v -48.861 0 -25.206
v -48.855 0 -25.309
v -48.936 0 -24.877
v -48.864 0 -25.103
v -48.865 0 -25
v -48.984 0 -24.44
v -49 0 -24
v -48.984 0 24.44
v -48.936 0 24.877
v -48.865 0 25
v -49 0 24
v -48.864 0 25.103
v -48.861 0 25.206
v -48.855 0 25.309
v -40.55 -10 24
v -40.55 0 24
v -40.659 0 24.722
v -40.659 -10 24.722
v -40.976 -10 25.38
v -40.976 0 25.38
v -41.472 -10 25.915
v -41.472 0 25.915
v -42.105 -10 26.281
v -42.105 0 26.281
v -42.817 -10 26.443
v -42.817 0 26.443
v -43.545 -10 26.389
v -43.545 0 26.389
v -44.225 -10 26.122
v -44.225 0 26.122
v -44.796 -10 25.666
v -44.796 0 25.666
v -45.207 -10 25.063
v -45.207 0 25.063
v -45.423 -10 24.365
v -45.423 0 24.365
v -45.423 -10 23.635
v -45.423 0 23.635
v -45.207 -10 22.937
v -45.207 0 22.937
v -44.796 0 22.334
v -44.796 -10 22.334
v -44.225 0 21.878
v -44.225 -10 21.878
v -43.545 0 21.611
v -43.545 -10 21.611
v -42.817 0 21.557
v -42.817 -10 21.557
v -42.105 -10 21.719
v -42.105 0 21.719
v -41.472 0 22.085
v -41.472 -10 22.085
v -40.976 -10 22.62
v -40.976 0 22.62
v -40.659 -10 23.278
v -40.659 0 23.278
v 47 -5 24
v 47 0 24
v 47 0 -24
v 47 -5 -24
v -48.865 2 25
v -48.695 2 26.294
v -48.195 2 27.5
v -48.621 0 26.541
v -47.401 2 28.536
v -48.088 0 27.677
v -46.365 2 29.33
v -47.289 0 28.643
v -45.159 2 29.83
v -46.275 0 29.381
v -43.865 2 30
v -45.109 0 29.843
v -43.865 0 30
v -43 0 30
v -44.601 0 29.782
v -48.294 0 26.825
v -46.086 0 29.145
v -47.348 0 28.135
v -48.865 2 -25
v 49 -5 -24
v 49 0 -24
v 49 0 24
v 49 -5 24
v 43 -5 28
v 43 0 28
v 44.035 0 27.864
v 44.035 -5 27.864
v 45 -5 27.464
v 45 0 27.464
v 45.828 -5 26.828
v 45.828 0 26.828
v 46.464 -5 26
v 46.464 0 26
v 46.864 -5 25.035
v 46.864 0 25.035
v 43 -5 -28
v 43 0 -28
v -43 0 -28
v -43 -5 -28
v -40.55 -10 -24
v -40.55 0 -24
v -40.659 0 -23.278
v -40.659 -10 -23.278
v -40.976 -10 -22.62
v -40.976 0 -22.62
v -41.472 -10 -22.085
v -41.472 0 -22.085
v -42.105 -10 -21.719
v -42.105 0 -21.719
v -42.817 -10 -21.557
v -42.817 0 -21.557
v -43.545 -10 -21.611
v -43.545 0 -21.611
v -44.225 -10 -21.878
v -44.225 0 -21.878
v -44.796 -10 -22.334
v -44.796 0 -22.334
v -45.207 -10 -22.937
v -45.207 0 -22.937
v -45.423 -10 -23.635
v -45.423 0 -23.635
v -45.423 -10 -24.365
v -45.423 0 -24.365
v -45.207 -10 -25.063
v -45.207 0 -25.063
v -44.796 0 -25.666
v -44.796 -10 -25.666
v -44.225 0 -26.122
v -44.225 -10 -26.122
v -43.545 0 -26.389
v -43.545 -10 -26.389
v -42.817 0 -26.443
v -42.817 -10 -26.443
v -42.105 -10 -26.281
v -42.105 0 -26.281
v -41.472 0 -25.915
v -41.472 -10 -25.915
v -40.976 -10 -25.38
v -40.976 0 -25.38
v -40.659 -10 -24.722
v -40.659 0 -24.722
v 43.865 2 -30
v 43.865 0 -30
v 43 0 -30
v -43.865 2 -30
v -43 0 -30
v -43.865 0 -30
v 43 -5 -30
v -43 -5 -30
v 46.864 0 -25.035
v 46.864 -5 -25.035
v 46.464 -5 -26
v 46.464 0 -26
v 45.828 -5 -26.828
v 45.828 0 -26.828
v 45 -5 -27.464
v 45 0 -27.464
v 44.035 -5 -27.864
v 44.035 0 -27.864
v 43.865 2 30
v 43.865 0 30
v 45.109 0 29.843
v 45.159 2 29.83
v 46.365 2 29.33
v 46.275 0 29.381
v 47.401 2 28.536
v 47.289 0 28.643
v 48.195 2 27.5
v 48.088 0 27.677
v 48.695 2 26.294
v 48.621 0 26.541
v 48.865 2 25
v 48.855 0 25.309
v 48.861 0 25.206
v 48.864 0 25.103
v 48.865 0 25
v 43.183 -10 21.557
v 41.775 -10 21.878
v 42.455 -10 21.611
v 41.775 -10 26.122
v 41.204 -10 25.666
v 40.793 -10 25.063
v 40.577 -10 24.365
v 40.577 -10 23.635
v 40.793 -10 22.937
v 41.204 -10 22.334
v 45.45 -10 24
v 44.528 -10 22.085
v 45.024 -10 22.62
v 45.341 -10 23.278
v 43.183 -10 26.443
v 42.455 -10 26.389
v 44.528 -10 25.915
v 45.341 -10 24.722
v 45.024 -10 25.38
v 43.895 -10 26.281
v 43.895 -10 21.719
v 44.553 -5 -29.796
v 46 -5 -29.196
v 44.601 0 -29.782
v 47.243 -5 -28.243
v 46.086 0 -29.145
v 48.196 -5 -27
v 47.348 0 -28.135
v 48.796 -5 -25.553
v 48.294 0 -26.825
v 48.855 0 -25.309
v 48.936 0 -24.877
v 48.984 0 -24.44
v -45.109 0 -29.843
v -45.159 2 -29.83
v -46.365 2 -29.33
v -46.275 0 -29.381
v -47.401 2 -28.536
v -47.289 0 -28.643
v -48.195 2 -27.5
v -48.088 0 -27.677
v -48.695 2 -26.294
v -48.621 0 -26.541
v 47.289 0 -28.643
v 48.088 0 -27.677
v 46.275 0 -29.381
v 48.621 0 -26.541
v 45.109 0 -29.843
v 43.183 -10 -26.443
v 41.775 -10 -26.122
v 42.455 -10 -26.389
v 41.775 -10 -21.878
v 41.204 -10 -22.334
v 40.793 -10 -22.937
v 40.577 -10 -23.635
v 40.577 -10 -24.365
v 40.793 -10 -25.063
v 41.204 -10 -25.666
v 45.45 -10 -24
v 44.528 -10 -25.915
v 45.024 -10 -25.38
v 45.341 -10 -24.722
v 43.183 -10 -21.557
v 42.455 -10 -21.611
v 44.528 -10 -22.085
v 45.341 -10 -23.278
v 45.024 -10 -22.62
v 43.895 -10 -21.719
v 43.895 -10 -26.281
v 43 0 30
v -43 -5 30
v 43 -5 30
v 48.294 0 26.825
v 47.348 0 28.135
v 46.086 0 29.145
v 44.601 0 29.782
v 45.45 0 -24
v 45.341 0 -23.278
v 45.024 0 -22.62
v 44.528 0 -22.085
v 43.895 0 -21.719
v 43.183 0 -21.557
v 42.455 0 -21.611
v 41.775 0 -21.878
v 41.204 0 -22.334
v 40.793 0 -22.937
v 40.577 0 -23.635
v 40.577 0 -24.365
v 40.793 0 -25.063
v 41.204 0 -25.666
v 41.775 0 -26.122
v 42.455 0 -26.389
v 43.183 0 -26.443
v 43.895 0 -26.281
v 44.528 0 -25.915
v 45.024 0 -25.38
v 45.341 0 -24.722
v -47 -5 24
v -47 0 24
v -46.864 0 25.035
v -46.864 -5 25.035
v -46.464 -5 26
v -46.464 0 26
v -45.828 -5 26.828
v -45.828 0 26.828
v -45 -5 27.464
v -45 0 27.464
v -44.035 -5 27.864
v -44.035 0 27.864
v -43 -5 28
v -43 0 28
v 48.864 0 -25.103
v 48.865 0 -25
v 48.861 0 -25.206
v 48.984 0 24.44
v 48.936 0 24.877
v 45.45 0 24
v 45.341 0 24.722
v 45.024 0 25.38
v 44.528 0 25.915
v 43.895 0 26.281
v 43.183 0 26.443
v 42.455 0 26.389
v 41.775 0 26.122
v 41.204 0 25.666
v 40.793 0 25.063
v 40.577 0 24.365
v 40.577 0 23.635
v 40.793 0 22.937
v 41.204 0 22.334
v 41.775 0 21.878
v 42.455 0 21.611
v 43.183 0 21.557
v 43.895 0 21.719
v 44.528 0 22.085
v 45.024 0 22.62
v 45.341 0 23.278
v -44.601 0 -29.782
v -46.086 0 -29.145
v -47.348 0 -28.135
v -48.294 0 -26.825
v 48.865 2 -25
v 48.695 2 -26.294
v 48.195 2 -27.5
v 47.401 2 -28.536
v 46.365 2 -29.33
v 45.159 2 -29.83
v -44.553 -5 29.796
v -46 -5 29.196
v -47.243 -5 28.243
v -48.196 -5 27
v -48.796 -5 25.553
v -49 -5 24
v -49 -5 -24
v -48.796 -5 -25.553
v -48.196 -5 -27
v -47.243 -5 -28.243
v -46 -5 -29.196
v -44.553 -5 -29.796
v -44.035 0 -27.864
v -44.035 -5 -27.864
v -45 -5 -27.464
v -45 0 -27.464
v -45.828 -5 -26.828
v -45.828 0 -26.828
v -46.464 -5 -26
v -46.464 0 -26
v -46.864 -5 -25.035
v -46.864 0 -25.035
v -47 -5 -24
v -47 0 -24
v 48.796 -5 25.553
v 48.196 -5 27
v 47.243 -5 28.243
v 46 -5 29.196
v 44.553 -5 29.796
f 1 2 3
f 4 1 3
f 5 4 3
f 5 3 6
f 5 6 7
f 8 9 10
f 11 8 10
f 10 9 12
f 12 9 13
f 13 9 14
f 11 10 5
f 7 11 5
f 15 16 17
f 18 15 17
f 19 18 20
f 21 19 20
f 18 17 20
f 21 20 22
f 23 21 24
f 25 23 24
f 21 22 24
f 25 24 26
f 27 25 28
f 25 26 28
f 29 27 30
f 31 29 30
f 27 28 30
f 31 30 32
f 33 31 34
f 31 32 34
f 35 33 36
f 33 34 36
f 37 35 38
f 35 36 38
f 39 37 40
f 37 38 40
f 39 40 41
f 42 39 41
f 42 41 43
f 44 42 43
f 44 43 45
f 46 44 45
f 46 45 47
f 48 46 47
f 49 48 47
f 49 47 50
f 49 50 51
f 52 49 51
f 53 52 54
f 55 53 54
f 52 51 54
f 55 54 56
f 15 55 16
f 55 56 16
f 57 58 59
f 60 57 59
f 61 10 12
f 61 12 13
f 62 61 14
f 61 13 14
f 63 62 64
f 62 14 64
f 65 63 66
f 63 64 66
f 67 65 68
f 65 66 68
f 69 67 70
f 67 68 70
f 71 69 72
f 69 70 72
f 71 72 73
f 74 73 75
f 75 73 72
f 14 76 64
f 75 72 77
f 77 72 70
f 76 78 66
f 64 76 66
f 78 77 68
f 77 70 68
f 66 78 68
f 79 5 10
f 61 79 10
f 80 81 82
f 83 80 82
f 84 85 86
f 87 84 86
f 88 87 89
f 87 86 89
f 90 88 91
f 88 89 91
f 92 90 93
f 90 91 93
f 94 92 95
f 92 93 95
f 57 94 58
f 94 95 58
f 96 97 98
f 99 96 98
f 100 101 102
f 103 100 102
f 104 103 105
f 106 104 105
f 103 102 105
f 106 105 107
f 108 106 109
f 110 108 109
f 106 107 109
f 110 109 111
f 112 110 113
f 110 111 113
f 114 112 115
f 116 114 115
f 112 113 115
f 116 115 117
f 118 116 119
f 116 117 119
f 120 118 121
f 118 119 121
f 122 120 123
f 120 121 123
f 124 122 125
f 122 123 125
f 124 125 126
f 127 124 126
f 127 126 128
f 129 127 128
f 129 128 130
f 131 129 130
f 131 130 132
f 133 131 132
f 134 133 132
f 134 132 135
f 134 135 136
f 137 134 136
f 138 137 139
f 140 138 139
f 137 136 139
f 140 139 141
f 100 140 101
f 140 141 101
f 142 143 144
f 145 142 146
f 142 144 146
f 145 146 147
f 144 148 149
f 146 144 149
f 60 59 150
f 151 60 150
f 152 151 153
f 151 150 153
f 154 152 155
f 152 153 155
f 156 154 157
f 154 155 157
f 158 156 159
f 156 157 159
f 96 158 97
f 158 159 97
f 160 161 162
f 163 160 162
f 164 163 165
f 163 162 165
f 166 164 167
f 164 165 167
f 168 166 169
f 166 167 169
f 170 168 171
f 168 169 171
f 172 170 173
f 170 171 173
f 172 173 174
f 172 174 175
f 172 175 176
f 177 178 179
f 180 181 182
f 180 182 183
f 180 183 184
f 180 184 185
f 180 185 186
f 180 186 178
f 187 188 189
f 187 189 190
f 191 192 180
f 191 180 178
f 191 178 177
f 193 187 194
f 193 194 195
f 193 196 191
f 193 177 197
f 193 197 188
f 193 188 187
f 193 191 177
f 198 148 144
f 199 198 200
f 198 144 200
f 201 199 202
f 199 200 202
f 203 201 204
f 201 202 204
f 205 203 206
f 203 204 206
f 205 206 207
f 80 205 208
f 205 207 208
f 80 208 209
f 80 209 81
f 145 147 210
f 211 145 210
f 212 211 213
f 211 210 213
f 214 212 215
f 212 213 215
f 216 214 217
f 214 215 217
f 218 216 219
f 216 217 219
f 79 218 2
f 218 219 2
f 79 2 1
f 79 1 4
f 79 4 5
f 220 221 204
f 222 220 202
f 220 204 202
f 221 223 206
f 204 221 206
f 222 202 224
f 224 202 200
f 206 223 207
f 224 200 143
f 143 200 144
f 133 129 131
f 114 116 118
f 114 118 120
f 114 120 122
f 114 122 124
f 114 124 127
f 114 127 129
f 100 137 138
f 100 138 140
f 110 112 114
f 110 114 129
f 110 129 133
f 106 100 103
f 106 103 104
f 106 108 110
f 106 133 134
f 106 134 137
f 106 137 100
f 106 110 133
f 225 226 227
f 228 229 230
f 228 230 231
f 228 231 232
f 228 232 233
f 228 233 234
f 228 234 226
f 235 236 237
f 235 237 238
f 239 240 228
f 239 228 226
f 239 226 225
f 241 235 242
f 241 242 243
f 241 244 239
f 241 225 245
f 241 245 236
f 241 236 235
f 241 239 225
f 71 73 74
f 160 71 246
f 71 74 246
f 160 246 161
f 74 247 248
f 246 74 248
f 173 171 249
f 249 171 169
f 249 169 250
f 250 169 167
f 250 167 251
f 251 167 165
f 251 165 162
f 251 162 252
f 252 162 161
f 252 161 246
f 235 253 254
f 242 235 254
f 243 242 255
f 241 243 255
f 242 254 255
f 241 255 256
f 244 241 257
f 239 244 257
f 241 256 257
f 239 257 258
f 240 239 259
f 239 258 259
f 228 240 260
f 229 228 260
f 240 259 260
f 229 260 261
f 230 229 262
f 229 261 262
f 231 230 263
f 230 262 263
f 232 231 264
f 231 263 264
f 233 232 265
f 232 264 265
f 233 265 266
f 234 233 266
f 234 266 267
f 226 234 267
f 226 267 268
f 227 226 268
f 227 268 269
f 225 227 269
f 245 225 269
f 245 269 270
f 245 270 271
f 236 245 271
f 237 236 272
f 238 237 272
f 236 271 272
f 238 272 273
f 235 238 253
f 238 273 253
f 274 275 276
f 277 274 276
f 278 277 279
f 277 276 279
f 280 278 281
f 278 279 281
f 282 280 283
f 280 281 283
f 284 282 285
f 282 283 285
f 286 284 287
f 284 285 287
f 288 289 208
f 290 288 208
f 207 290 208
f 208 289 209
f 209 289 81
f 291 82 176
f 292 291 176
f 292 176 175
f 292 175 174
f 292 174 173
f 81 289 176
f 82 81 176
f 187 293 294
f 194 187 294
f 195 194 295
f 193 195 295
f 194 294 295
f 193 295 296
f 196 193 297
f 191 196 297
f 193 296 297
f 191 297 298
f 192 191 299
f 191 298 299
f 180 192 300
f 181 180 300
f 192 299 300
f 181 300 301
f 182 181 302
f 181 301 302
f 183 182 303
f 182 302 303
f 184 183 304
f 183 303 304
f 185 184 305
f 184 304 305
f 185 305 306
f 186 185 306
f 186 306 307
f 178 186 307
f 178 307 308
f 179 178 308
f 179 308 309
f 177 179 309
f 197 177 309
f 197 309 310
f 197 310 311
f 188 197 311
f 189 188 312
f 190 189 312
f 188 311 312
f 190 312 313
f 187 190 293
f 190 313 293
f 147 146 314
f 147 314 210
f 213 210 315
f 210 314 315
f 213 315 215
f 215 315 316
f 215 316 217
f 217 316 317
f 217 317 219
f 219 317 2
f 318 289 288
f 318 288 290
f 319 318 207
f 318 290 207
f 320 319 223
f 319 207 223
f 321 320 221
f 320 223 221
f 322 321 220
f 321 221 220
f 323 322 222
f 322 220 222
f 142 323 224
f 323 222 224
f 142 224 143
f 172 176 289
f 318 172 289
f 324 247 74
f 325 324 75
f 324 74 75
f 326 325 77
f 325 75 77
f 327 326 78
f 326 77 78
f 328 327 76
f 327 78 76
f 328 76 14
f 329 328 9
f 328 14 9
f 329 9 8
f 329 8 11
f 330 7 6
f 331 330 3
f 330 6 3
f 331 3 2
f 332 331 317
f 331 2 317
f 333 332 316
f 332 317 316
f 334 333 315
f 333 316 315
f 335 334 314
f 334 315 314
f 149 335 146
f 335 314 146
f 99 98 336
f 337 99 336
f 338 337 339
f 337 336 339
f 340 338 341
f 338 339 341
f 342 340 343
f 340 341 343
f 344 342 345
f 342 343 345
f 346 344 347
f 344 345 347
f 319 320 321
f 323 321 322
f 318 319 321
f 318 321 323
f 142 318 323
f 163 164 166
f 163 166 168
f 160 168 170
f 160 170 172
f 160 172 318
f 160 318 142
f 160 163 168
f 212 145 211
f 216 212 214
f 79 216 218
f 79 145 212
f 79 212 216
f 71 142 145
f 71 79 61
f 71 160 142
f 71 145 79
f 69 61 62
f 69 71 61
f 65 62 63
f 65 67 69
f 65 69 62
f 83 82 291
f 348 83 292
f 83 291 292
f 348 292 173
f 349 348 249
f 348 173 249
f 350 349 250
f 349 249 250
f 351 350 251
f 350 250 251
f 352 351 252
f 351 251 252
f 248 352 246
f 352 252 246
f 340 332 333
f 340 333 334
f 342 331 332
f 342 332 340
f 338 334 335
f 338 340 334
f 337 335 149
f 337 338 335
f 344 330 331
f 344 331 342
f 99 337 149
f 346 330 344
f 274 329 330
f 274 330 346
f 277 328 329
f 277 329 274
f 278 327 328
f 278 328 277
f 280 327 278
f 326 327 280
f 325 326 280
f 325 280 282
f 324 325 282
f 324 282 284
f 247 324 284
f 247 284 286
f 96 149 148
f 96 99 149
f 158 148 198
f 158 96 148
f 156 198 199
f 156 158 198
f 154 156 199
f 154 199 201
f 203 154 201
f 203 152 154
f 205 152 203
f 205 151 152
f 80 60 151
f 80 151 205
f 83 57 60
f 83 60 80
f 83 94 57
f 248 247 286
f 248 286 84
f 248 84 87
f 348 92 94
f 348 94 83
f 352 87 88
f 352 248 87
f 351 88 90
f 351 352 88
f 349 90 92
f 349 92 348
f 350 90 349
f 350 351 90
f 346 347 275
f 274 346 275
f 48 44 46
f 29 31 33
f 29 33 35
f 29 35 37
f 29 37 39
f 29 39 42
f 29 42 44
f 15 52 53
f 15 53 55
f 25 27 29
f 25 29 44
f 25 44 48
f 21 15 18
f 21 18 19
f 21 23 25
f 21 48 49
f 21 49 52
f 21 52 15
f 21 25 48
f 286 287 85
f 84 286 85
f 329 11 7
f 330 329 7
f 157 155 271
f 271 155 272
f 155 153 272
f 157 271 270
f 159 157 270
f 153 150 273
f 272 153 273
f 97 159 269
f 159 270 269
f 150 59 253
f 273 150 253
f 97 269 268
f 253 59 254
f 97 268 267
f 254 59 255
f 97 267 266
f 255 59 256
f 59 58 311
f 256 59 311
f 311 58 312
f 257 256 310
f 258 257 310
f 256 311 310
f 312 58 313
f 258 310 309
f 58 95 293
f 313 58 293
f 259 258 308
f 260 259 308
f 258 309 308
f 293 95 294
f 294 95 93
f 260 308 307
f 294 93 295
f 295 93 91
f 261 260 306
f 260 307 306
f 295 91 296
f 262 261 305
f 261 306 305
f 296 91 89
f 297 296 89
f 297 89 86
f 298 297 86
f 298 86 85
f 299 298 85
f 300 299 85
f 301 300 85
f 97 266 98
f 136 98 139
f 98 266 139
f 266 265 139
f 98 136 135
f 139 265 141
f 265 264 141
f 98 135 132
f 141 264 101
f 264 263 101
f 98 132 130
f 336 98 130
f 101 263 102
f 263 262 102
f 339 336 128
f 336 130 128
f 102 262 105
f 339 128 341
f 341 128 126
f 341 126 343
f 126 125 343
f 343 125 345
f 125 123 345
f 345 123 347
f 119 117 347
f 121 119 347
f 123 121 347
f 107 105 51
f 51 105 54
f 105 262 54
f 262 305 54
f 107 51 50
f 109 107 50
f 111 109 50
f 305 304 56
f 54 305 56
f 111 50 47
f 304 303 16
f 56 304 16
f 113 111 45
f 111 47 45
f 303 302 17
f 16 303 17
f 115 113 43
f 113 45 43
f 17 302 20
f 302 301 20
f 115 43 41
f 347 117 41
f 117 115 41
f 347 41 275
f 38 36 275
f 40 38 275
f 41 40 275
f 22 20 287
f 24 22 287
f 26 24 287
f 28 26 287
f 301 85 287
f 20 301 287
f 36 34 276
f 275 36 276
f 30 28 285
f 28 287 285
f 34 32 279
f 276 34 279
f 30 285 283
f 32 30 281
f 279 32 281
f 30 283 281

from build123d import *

# Parameters (mm, degrees)
F1_R     = 2.45
F2_DEPTH = 10
F3_DEPTH = 5
F5_DEPTH = 2


with BuildPart() as f2:
    # F1 (on Front) → F2 (new body)
    with BuildSketch(Plane.XZ):
        with Locations((-43, 24)):
            Circle(F1_R)
        with Locations((-43, -24)):
            Circle(F1_R)
        with Locations((43, -24)):
            Circle(F1_R)
        with Locations((43, 24)):
            Circle(F1_R)
    extrude(amount=F2_DEPTH)



with BuildPart() as f3:
    # F0 (on Front) → F3 (new body)
    with BuildSketch(Plane.XZ):
        with BuildLine():
            ThreePointArc((49, 24), (47.242641, 28.242641), (43, 30))
            Line((43, 30), (-43, 30))
            ThreePointArc((-43, 30), (-47.242641, 28.242641), (-49, 24))
            Line((-49, 24), (-49, -24))
            ThreePointArc((-49, -24), (-47.242641, -28.242641), (-43, -30))
            Line((-43, -30), (43, -30))
            ThreePointArc((43, -30), (47.242641, -28.242641), (49, -24))
            Line((49, -24), (49, 24))
        make_face()
        with BuildLine():
            ThreePointArc((47, -24), (45.828427, -26.828427), (43, -28))
            Line((43, -28), (-43, -28))
            ThreePointArc((-43, -28), (-45.828427, -26.828427), (-47, -24))
            Line((-47, -24), (-47, 24))
            ThreePointArc((-47, 24), (-45.828427, 26.828427), (-43, 28))
            Line((-43, 28), (43, 28))
            ThreePointArc((43, 28), (45.828427, 26.828427), (47, 24))
            Line((47, 24), (47, -24))
        make_face(mode=Mode.SUBTRACT)
    extrude(amount=F3_DEPTH)


with BuildPart() as f2_1:
    add(f2.part)

    add(f3.part)  # F5 merges F3
    # F4 (on face) → F5 (join)
    with BuildSketch(Plane(origin=(0, 0, 0), x_dir=(-1, 0, 0), z_dir=(0, 1, 0))):
        with BuildLine():
            Line((43.864976, 30), (-43.864976, 30))
            ThreePointArc((-43.864976, 30), (-47.400509, 28.535534), (-48.864976, 25))
            Line((-48.864976, 25), (-48.864976, -25))
            ThreePointArc((-48.864976, -25), (-47.400509, -28.535534), (-43.864976, -30))
            Line((-43.864976, -30), (43.864976, -30))
            ThreePointArc((43.864976, -30), (47.400509, -28.535534), (48.864976, -25))
            Line((48.864976, -25), (48.864976, 25))
            ThreePointArc((48.864976, 25), (47.400509, 28.535534), (43.864976, 30))
        make_face()
    extrude(amount=F5_DEPTH)


solid = f2_1.part
